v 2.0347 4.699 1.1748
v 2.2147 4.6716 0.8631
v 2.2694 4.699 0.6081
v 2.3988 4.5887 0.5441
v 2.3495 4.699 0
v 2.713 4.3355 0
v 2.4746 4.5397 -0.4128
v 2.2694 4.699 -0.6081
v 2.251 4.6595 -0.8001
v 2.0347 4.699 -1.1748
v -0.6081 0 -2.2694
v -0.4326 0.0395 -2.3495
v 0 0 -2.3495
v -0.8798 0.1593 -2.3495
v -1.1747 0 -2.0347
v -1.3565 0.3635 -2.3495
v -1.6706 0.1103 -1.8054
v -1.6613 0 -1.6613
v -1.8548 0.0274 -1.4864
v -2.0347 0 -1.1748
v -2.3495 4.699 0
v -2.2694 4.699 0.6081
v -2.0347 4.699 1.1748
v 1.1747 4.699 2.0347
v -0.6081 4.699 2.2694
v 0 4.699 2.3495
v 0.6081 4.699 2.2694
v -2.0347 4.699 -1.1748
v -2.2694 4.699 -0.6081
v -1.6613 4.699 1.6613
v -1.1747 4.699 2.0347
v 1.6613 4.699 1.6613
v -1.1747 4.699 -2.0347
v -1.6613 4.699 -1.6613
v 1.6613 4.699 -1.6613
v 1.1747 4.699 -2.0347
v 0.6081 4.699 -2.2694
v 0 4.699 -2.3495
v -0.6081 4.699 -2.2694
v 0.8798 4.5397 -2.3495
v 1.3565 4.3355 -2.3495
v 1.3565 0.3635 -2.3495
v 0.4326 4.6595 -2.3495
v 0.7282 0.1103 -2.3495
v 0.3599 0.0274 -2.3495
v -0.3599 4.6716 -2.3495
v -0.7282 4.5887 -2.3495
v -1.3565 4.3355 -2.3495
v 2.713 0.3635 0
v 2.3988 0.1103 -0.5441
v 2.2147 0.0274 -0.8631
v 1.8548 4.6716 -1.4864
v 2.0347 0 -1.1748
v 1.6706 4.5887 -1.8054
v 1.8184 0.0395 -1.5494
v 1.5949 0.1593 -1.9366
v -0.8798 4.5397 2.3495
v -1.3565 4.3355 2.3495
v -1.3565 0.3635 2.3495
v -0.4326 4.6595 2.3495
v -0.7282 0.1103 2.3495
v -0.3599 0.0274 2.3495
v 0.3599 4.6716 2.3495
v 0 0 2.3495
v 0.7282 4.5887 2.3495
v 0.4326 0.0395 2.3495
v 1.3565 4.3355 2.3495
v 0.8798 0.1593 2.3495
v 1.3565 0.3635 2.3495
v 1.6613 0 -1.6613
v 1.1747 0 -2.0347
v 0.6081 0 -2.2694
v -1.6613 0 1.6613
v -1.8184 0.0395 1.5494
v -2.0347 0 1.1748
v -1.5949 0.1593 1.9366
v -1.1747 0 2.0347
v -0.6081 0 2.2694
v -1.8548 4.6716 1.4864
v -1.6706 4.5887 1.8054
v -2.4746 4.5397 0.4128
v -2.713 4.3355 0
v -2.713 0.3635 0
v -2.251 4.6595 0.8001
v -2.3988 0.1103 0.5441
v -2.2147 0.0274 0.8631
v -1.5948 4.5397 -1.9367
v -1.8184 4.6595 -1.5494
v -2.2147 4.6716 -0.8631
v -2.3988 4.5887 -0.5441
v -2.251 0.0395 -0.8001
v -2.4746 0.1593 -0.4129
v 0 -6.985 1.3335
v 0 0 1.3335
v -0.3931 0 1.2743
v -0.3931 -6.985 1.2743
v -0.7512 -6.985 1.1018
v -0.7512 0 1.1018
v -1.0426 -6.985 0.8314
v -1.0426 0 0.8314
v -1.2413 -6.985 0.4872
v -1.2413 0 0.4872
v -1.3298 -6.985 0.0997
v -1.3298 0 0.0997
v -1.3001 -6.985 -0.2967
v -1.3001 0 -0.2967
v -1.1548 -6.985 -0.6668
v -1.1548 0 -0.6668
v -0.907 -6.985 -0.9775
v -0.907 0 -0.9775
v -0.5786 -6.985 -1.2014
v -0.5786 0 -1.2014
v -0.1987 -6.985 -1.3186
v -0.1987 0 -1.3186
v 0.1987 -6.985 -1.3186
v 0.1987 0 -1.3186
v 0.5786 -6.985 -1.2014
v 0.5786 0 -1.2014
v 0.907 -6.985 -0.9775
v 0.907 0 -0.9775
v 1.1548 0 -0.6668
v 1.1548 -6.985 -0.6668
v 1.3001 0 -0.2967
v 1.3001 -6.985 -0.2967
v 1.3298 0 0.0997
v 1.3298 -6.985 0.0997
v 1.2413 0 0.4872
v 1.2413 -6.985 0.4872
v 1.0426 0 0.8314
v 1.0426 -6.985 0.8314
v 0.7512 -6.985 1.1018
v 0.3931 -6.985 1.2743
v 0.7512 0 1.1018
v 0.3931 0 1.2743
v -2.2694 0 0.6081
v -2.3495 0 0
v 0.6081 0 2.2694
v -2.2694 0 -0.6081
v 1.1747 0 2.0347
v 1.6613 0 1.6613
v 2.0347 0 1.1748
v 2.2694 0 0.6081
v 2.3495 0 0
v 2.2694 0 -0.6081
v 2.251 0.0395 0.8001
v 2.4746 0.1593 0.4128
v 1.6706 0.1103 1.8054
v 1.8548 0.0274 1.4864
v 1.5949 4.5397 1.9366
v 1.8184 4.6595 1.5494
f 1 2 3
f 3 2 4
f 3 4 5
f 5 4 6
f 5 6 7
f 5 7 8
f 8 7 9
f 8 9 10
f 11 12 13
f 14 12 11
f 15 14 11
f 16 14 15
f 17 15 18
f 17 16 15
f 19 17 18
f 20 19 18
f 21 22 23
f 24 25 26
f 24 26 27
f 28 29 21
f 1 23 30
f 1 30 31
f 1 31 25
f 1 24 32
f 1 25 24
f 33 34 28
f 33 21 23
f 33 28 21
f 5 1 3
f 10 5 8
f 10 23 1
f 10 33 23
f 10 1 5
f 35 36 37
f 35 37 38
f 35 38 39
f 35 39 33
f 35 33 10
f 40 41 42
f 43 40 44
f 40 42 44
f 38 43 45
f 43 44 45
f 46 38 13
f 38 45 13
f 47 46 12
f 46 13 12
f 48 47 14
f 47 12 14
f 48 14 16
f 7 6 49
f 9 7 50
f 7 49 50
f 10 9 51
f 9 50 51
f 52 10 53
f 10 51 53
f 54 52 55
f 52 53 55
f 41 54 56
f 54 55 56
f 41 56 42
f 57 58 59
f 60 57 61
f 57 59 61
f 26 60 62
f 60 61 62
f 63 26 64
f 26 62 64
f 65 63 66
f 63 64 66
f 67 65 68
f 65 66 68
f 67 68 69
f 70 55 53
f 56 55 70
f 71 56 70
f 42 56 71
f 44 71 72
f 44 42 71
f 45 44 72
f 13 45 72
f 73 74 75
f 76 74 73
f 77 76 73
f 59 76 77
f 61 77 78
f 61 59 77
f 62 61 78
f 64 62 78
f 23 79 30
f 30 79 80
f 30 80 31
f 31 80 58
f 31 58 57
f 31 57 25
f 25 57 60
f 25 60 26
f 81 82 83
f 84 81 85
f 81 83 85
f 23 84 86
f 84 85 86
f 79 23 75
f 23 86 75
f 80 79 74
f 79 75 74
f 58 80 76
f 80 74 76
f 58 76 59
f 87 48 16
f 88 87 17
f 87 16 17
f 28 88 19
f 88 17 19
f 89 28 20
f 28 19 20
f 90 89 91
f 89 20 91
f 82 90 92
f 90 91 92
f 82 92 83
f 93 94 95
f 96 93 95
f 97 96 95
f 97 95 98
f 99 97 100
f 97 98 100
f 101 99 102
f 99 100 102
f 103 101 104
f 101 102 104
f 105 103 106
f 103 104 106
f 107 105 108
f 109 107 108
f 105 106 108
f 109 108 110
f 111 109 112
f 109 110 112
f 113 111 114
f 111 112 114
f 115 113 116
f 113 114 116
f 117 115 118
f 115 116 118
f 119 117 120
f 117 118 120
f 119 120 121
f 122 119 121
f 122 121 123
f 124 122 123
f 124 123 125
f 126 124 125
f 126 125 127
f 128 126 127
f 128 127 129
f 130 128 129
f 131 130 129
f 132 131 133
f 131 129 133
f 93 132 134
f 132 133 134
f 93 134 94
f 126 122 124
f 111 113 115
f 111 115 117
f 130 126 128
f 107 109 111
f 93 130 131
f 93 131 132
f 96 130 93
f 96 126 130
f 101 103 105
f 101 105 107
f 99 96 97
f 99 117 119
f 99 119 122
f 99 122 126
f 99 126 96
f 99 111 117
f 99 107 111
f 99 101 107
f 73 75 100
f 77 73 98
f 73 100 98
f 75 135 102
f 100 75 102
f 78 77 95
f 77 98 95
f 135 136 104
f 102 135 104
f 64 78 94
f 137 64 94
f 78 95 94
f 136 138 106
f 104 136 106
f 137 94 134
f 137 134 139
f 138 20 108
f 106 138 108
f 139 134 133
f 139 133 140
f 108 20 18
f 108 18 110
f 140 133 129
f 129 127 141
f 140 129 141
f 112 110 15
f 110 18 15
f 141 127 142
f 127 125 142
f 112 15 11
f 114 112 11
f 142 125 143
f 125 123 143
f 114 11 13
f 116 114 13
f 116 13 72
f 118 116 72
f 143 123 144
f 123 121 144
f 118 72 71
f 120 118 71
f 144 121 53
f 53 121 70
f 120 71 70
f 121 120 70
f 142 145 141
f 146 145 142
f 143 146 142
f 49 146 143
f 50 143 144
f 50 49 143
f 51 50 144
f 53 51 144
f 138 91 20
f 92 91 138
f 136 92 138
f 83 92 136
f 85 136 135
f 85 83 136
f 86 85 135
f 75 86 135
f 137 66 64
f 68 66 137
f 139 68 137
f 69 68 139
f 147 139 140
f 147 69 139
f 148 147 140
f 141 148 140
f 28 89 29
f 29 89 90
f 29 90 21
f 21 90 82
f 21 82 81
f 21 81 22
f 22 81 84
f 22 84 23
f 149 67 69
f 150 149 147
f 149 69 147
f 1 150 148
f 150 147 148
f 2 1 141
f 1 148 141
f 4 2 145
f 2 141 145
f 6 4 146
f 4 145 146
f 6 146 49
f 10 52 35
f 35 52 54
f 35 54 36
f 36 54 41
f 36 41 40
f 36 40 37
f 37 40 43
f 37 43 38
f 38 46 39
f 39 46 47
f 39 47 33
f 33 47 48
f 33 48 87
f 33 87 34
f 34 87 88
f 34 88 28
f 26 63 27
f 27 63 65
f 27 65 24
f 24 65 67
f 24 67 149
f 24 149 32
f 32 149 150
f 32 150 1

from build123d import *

# Parameters (mm, degrees)
BOSS_EXTRUDE1_DEPTH = 4.699
SKETCH2_R           = 1.3335
BOSS_EXTRUDE2_DEPTH = 6.985


with BuildPart() as part:
    # Sketch1 → Boss-Extrude1 (new body)
    with BuildSketch(Plane(origin=(0, 0, 0), x_dir=(1, 0, 0), z_dir=(0, 1, 0))):
        Polygon((2.712968915, 0), (1.356484457, 2.3495), (-1.356484457, 2.3495), (-2.712968915, 0), (-1.356484457, -2.3495), (1.356484457, -2.3495), align=None)
    extrude(amount=BOSS_EXTRUDE1_DEPTH)

    # Sketch2 → Boss-Extrude2 (add)
    with BuildSketch(Plane.XZ):
        with Locations(Location((0, 0, 0), (0, 0, 90))):
            Circle(SKETCH2_R)
    extrude(amount=BOSS_EXTRUDE2_DEPTH)

    # Sketch5 → Cut-Revolve1 (revolve, cut)
    with BuildSketch(Plane(origin=(0, 0, 0), x_dir=(0, 0, -1), z_dir=(1, 0, 0))):
        Polygon((2.3495, 4.699), (3.223173217, 3.825326783), (3.223173217, 4.699), align=None)
    cut_revolve1 = revolve(axis=Axis((0, 4.699, 0), (0, 1, 0)), mode=Mode.SUBTRACT)

    # Mirror1: Cut-Revolve1 across plane
    add(cut_revolve1.mirror(Plane.ZX.offset(2.3495)), mode=Mode.SUBTRACT)


solid = part.part
